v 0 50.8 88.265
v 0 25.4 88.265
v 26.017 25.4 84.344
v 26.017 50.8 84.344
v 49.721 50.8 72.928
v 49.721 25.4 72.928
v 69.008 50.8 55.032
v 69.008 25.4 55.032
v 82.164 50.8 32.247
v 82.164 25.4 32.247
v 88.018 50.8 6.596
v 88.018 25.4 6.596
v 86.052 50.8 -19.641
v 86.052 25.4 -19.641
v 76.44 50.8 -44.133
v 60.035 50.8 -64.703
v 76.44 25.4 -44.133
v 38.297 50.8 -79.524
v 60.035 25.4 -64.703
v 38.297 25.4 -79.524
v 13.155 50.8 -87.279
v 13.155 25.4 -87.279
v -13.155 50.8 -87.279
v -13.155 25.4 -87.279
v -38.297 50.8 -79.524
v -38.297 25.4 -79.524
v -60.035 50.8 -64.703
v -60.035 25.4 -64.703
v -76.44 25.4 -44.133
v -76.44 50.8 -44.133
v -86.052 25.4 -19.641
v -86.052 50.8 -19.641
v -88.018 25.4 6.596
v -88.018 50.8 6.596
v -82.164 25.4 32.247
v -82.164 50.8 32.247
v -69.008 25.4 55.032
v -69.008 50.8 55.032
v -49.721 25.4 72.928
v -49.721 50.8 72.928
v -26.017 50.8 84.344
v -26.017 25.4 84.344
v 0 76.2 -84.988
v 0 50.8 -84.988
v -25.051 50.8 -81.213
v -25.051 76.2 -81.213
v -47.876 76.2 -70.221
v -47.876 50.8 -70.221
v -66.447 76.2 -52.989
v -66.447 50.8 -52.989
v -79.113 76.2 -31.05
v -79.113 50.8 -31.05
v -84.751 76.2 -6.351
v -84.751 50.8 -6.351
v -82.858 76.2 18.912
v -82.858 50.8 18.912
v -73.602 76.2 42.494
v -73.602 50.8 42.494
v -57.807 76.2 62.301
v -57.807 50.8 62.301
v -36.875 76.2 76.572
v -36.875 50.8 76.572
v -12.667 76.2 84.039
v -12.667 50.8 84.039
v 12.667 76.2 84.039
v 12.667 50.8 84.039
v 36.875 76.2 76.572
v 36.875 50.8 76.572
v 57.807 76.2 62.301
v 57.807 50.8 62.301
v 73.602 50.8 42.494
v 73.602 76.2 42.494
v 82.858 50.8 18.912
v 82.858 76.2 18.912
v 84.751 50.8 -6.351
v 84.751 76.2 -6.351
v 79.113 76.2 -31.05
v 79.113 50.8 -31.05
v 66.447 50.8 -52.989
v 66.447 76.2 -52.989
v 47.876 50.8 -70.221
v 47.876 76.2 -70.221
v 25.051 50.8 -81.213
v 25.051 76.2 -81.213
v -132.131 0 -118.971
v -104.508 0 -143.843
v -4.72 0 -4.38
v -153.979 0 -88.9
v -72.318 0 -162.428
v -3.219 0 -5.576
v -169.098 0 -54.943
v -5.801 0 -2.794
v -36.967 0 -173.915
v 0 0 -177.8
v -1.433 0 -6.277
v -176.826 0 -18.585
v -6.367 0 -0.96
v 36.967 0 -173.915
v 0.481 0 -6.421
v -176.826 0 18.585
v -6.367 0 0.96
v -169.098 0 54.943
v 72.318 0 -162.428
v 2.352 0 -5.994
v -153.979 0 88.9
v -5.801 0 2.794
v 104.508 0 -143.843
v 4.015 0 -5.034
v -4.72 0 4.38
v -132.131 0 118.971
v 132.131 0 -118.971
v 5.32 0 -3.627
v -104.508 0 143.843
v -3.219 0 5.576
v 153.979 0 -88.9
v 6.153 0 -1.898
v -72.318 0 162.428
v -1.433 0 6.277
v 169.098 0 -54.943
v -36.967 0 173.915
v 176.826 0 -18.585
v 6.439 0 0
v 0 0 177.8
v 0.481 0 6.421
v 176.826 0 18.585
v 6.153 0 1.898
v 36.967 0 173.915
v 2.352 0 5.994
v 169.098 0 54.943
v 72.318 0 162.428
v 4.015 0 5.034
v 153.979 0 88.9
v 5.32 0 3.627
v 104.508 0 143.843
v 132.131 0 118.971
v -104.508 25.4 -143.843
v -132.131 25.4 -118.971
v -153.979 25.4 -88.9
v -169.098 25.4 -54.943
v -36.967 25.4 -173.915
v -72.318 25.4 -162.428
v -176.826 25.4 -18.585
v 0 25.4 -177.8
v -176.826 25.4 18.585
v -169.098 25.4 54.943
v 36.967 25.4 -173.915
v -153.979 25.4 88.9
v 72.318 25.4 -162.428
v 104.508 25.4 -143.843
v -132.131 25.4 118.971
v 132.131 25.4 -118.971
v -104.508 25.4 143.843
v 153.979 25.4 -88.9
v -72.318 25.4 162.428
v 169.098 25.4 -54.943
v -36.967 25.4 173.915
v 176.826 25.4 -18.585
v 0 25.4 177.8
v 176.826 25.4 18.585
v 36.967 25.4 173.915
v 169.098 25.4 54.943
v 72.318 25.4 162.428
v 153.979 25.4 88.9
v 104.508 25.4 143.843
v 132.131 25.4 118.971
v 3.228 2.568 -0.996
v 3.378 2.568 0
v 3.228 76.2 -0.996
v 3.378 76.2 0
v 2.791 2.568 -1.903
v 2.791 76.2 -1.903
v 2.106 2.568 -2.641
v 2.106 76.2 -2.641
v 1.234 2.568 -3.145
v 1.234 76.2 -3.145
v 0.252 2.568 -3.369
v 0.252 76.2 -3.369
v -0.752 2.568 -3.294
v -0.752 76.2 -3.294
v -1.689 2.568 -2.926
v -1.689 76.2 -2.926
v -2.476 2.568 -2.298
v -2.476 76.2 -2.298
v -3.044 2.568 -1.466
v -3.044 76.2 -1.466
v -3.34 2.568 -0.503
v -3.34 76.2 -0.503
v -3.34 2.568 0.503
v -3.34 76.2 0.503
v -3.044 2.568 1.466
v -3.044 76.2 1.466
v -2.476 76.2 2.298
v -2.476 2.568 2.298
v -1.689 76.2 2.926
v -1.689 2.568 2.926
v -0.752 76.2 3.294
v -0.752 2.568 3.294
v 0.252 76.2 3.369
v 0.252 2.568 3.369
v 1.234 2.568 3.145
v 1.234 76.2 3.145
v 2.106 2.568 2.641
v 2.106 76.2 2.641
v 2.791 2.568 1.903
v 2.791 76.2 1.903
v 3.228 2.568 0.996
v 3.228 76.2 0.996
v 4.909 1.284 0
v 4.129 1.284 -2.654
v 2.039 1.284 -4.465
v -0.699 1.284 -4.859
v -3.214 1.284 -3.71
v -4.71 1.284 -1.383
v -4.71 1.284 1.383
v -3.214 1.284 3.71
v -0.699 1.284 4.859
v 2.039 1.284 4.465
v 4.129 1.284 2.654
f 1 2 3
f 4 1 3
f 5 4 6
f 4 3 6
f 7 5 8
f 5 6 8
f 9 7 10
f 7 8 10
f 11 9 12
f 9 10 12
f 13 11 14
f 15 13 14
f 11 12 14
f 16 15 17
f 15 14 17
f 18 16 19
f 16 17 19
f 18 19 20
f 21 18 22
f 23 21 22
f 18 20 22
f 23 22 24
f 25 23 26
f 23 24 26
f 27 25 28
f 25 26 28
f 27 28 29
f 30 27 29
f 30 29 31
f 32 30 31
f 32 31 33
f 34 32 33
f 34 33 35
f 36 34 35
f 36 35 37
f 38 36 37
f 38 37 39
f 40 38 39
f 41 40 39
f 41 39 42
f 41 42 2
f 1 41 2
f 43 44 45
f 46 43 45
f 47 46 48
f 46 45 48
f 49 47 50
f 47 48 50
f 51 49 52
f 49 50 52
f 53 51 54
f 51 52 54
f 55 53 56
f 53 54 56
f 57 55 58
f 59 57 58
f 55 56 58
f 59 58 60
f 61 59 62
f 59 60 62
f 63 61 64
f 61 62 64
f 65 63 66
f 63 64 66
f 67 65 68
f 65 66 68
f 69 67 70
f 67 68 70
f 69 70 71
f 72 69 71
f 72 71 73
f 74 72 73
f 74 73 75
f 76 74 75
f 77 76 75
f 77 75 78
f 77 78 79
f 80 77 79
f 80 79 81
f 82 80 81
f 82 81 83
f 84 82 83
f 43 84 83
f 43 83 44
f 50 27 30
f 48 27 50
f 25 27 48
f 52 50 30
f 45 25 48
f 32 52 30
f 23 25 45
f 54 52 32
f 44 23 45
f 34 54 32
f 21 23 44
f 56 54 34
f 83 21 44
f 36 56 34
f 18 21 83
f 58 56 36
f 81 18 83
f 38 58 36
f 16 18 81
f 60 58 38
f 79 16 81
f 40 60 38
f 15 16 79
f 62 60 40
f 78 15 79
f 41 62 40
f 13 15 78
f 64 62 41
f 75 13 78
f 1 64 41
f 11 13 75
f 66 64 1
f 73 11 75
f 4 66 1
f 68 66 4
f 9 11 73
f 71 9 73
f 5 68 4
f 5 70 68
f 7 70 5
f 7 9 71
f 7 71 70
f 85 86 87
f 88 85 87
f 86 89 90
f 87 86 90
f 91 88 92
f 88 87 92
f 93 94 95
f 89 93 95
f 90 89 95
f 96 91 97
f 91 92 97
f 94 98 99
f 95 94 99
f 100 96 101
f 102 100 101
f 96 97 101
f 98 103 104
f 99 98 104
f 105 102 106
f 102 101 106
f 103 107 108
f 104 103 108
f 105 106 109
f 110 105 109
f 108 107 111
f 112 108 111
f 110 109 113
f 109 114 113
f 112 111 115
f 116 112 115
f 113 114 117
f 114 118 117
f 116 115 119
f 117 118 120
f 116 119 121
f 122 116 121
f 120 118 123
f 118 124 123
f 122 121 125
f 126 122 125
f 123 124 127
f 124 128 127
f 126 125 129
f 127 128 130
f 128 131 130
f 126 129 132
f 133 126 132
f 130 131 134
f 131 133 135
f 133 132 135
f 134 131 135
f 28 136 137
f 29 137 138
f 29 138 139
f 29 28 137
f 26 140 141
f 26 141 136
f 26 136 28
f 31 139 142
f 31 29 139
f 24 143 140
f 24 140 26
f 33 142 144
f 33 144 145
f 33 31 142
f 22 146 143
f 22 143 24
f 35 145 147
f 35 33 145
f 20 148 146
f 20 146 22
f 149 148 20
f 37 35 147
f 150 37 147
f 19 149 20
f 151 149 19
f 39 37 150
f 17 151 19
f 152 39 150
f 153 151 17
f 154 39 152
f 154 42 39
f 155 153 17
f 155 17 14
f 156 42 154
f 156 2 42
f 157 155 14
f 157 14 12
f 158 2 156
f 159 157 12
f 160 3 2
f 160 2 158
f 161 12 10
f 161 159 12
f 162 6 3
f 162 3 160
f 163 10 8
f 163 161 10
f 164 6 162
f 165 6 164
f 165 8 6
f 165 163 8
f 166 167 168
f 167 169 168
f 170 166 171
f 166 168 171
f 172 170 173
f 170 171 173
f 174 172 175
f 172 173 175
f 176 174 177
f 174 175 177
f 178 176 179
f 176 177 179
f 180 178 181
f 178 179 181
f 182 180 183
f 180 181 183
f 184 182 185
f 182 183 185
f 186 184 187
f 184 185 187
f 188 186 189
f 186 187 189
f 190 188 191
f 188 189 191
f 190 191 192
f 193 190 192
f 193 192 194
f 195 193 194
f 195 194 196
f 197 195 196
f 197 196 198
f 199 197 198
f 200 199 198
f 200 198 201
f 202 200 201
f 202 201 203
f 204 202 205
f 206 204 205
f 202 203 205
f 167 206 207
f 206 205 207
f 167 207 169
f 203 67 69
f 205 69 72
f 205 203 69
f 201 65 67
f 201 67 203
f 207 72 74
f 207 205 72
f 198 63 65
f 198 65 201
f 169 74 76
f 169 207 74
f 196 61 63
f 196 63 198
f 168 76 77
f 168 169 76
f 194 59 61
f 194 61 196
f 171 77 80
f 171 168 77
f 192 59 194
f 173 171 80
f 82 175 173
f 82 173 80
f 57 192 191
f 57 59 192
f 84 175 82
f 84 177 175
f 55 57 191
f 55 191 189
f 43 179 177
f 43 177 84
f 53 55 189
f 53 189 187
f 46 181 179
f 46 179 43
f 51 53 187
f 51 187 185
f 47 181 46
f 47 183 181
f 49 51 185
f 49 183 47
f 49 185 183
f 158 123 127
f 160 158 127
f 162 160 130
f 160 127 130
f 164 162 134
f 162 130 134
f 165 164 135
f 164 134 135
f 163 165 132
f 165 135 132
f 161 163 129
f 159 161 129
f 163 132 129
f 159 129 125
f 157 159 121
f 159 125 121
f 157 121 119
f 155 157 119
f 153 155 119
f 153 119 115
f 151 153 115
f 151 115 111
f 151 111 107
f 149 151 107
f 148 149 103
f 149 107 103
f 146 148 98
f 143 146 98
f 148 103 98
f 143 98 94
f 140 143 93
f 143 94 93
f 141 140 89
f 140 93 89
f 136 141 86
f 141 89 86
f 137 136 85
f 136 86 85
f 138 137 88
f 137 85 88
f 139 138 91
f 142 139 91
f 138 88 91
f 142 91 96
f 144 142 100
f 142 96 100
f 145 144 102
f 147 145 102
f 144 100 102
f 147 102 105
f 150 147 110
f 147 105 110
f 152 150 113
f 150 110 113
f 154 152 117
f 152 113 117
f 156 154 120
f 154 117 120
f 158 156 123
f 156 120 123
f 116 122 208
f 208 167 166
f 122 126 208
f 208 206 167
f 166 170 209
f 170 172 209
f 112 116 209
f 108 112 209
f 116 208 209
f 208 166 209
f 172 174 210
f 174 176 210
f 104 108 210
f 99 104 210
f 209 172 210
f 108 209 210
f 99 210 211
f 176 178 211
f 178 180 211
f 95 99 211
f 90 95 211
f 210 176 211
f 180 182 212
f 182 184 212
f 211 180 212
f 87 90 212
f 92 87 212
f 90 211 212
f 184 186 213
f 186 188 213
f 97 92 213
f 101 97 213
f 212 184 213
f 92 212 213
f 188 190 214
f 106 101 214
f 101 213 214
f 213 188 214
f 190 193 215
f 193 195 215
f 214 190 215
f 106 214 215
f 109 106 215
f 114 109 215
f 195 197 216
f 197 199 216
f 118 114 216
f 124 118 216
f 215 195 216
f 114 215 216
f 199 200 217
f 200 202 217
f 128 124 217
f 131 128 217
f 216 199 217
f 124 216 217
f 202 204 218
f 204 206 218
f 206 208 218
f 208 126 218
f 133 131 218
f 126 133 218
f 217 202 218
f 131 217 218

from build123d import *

# Parameters (mm, degrees)
SKETCH1_R                                           = 84.9884
BOSS_EXTRUDE1_DEPTH                                 = 76.2
SKETCH1_3_R                                         = 88.265
SKETCH1_3_R_2                                       = 84.9884
BOSS_EXTRUDE2_DEPTH                                 = 50.8
SKETCH1_4_R                                         = 177.8
SKETCH1_4_R_2                                       = 88.265
BOSS_EXTRUDE3_DEPTH                                 = 25.4
CSK_FOR_1_4_FLAT_HEAD_MACHINE_SCREW_100_D           = 6.7564
CSK_FOR_1_4_FLAT_HEAD_MACHINE_SCREW_100_CSINK_D     = 12.8778
CSK_FOR_1_4_FLAT_HEAD_MACHINE_SCREW_100_CSINK_ANGLE = 100


with BuildPart() as part:
    # Sketch1 → Boss-Extrude1 (new body)
    with BuildSketch(Plane(origin=(0, 0, 0), x_dir=(1, 0, 0), z_dir=(0, 1, 0))):
        Circle(SKETCH1_R)
    extrude(amount=BOSS_EXTRUDE1_DEPTH)

    # Sketch1<3> → Boss-Extrude2 (add)
    with BuildSketch(Plane(origin=(0, 0, 0), x_dir=(1, 0, 0), z_dir=(0, 1, 0))):
        Circle(SKETCH1_3_R)
        Circle(SKETCH1_3_R_2, mode=Mode.SUBTRACT)
    extrude(amount=BOSS_EXTRUDE2_DEPTH)

    # Sketch1<4> → Boss-Extrude3 (add)
    with BuildSketch(Plane(origin=(0, 0, 0), x_dir=(1, 0, 0), z_dir=(0, 1, 0))):
        Circle(SKETCH1_4_R)
        Circle(SKETCH1_4_R_2, mode=Mode.SUBTRACT)
    extrude(amount=BOSS_EXTRUDE3_DEPTH)

    # CSK for 1/4 Flat Head Machine Screw (100)1 (through all)
    with Locations(Plane(origin=(0, 0, 0), x_dir=(-1, 0, 0), z_dir=(0, -1, 0))):
        with Locations((0, 0)):
            CounterSinkHole(CSK_FOR_1_4_FLAT_HEAD_MACHINE_SCREW_100_D / 2, CSK_FOR_1_4_FLAT_HEAD_MACHINE_SCREW_100_CSINK_D / 2, counter_sink_angle=CSK_FOR_1_4_FLAT_HEAD_MACHINE_SCREW_100_CSINK_ANGLE)


solid = part.part
